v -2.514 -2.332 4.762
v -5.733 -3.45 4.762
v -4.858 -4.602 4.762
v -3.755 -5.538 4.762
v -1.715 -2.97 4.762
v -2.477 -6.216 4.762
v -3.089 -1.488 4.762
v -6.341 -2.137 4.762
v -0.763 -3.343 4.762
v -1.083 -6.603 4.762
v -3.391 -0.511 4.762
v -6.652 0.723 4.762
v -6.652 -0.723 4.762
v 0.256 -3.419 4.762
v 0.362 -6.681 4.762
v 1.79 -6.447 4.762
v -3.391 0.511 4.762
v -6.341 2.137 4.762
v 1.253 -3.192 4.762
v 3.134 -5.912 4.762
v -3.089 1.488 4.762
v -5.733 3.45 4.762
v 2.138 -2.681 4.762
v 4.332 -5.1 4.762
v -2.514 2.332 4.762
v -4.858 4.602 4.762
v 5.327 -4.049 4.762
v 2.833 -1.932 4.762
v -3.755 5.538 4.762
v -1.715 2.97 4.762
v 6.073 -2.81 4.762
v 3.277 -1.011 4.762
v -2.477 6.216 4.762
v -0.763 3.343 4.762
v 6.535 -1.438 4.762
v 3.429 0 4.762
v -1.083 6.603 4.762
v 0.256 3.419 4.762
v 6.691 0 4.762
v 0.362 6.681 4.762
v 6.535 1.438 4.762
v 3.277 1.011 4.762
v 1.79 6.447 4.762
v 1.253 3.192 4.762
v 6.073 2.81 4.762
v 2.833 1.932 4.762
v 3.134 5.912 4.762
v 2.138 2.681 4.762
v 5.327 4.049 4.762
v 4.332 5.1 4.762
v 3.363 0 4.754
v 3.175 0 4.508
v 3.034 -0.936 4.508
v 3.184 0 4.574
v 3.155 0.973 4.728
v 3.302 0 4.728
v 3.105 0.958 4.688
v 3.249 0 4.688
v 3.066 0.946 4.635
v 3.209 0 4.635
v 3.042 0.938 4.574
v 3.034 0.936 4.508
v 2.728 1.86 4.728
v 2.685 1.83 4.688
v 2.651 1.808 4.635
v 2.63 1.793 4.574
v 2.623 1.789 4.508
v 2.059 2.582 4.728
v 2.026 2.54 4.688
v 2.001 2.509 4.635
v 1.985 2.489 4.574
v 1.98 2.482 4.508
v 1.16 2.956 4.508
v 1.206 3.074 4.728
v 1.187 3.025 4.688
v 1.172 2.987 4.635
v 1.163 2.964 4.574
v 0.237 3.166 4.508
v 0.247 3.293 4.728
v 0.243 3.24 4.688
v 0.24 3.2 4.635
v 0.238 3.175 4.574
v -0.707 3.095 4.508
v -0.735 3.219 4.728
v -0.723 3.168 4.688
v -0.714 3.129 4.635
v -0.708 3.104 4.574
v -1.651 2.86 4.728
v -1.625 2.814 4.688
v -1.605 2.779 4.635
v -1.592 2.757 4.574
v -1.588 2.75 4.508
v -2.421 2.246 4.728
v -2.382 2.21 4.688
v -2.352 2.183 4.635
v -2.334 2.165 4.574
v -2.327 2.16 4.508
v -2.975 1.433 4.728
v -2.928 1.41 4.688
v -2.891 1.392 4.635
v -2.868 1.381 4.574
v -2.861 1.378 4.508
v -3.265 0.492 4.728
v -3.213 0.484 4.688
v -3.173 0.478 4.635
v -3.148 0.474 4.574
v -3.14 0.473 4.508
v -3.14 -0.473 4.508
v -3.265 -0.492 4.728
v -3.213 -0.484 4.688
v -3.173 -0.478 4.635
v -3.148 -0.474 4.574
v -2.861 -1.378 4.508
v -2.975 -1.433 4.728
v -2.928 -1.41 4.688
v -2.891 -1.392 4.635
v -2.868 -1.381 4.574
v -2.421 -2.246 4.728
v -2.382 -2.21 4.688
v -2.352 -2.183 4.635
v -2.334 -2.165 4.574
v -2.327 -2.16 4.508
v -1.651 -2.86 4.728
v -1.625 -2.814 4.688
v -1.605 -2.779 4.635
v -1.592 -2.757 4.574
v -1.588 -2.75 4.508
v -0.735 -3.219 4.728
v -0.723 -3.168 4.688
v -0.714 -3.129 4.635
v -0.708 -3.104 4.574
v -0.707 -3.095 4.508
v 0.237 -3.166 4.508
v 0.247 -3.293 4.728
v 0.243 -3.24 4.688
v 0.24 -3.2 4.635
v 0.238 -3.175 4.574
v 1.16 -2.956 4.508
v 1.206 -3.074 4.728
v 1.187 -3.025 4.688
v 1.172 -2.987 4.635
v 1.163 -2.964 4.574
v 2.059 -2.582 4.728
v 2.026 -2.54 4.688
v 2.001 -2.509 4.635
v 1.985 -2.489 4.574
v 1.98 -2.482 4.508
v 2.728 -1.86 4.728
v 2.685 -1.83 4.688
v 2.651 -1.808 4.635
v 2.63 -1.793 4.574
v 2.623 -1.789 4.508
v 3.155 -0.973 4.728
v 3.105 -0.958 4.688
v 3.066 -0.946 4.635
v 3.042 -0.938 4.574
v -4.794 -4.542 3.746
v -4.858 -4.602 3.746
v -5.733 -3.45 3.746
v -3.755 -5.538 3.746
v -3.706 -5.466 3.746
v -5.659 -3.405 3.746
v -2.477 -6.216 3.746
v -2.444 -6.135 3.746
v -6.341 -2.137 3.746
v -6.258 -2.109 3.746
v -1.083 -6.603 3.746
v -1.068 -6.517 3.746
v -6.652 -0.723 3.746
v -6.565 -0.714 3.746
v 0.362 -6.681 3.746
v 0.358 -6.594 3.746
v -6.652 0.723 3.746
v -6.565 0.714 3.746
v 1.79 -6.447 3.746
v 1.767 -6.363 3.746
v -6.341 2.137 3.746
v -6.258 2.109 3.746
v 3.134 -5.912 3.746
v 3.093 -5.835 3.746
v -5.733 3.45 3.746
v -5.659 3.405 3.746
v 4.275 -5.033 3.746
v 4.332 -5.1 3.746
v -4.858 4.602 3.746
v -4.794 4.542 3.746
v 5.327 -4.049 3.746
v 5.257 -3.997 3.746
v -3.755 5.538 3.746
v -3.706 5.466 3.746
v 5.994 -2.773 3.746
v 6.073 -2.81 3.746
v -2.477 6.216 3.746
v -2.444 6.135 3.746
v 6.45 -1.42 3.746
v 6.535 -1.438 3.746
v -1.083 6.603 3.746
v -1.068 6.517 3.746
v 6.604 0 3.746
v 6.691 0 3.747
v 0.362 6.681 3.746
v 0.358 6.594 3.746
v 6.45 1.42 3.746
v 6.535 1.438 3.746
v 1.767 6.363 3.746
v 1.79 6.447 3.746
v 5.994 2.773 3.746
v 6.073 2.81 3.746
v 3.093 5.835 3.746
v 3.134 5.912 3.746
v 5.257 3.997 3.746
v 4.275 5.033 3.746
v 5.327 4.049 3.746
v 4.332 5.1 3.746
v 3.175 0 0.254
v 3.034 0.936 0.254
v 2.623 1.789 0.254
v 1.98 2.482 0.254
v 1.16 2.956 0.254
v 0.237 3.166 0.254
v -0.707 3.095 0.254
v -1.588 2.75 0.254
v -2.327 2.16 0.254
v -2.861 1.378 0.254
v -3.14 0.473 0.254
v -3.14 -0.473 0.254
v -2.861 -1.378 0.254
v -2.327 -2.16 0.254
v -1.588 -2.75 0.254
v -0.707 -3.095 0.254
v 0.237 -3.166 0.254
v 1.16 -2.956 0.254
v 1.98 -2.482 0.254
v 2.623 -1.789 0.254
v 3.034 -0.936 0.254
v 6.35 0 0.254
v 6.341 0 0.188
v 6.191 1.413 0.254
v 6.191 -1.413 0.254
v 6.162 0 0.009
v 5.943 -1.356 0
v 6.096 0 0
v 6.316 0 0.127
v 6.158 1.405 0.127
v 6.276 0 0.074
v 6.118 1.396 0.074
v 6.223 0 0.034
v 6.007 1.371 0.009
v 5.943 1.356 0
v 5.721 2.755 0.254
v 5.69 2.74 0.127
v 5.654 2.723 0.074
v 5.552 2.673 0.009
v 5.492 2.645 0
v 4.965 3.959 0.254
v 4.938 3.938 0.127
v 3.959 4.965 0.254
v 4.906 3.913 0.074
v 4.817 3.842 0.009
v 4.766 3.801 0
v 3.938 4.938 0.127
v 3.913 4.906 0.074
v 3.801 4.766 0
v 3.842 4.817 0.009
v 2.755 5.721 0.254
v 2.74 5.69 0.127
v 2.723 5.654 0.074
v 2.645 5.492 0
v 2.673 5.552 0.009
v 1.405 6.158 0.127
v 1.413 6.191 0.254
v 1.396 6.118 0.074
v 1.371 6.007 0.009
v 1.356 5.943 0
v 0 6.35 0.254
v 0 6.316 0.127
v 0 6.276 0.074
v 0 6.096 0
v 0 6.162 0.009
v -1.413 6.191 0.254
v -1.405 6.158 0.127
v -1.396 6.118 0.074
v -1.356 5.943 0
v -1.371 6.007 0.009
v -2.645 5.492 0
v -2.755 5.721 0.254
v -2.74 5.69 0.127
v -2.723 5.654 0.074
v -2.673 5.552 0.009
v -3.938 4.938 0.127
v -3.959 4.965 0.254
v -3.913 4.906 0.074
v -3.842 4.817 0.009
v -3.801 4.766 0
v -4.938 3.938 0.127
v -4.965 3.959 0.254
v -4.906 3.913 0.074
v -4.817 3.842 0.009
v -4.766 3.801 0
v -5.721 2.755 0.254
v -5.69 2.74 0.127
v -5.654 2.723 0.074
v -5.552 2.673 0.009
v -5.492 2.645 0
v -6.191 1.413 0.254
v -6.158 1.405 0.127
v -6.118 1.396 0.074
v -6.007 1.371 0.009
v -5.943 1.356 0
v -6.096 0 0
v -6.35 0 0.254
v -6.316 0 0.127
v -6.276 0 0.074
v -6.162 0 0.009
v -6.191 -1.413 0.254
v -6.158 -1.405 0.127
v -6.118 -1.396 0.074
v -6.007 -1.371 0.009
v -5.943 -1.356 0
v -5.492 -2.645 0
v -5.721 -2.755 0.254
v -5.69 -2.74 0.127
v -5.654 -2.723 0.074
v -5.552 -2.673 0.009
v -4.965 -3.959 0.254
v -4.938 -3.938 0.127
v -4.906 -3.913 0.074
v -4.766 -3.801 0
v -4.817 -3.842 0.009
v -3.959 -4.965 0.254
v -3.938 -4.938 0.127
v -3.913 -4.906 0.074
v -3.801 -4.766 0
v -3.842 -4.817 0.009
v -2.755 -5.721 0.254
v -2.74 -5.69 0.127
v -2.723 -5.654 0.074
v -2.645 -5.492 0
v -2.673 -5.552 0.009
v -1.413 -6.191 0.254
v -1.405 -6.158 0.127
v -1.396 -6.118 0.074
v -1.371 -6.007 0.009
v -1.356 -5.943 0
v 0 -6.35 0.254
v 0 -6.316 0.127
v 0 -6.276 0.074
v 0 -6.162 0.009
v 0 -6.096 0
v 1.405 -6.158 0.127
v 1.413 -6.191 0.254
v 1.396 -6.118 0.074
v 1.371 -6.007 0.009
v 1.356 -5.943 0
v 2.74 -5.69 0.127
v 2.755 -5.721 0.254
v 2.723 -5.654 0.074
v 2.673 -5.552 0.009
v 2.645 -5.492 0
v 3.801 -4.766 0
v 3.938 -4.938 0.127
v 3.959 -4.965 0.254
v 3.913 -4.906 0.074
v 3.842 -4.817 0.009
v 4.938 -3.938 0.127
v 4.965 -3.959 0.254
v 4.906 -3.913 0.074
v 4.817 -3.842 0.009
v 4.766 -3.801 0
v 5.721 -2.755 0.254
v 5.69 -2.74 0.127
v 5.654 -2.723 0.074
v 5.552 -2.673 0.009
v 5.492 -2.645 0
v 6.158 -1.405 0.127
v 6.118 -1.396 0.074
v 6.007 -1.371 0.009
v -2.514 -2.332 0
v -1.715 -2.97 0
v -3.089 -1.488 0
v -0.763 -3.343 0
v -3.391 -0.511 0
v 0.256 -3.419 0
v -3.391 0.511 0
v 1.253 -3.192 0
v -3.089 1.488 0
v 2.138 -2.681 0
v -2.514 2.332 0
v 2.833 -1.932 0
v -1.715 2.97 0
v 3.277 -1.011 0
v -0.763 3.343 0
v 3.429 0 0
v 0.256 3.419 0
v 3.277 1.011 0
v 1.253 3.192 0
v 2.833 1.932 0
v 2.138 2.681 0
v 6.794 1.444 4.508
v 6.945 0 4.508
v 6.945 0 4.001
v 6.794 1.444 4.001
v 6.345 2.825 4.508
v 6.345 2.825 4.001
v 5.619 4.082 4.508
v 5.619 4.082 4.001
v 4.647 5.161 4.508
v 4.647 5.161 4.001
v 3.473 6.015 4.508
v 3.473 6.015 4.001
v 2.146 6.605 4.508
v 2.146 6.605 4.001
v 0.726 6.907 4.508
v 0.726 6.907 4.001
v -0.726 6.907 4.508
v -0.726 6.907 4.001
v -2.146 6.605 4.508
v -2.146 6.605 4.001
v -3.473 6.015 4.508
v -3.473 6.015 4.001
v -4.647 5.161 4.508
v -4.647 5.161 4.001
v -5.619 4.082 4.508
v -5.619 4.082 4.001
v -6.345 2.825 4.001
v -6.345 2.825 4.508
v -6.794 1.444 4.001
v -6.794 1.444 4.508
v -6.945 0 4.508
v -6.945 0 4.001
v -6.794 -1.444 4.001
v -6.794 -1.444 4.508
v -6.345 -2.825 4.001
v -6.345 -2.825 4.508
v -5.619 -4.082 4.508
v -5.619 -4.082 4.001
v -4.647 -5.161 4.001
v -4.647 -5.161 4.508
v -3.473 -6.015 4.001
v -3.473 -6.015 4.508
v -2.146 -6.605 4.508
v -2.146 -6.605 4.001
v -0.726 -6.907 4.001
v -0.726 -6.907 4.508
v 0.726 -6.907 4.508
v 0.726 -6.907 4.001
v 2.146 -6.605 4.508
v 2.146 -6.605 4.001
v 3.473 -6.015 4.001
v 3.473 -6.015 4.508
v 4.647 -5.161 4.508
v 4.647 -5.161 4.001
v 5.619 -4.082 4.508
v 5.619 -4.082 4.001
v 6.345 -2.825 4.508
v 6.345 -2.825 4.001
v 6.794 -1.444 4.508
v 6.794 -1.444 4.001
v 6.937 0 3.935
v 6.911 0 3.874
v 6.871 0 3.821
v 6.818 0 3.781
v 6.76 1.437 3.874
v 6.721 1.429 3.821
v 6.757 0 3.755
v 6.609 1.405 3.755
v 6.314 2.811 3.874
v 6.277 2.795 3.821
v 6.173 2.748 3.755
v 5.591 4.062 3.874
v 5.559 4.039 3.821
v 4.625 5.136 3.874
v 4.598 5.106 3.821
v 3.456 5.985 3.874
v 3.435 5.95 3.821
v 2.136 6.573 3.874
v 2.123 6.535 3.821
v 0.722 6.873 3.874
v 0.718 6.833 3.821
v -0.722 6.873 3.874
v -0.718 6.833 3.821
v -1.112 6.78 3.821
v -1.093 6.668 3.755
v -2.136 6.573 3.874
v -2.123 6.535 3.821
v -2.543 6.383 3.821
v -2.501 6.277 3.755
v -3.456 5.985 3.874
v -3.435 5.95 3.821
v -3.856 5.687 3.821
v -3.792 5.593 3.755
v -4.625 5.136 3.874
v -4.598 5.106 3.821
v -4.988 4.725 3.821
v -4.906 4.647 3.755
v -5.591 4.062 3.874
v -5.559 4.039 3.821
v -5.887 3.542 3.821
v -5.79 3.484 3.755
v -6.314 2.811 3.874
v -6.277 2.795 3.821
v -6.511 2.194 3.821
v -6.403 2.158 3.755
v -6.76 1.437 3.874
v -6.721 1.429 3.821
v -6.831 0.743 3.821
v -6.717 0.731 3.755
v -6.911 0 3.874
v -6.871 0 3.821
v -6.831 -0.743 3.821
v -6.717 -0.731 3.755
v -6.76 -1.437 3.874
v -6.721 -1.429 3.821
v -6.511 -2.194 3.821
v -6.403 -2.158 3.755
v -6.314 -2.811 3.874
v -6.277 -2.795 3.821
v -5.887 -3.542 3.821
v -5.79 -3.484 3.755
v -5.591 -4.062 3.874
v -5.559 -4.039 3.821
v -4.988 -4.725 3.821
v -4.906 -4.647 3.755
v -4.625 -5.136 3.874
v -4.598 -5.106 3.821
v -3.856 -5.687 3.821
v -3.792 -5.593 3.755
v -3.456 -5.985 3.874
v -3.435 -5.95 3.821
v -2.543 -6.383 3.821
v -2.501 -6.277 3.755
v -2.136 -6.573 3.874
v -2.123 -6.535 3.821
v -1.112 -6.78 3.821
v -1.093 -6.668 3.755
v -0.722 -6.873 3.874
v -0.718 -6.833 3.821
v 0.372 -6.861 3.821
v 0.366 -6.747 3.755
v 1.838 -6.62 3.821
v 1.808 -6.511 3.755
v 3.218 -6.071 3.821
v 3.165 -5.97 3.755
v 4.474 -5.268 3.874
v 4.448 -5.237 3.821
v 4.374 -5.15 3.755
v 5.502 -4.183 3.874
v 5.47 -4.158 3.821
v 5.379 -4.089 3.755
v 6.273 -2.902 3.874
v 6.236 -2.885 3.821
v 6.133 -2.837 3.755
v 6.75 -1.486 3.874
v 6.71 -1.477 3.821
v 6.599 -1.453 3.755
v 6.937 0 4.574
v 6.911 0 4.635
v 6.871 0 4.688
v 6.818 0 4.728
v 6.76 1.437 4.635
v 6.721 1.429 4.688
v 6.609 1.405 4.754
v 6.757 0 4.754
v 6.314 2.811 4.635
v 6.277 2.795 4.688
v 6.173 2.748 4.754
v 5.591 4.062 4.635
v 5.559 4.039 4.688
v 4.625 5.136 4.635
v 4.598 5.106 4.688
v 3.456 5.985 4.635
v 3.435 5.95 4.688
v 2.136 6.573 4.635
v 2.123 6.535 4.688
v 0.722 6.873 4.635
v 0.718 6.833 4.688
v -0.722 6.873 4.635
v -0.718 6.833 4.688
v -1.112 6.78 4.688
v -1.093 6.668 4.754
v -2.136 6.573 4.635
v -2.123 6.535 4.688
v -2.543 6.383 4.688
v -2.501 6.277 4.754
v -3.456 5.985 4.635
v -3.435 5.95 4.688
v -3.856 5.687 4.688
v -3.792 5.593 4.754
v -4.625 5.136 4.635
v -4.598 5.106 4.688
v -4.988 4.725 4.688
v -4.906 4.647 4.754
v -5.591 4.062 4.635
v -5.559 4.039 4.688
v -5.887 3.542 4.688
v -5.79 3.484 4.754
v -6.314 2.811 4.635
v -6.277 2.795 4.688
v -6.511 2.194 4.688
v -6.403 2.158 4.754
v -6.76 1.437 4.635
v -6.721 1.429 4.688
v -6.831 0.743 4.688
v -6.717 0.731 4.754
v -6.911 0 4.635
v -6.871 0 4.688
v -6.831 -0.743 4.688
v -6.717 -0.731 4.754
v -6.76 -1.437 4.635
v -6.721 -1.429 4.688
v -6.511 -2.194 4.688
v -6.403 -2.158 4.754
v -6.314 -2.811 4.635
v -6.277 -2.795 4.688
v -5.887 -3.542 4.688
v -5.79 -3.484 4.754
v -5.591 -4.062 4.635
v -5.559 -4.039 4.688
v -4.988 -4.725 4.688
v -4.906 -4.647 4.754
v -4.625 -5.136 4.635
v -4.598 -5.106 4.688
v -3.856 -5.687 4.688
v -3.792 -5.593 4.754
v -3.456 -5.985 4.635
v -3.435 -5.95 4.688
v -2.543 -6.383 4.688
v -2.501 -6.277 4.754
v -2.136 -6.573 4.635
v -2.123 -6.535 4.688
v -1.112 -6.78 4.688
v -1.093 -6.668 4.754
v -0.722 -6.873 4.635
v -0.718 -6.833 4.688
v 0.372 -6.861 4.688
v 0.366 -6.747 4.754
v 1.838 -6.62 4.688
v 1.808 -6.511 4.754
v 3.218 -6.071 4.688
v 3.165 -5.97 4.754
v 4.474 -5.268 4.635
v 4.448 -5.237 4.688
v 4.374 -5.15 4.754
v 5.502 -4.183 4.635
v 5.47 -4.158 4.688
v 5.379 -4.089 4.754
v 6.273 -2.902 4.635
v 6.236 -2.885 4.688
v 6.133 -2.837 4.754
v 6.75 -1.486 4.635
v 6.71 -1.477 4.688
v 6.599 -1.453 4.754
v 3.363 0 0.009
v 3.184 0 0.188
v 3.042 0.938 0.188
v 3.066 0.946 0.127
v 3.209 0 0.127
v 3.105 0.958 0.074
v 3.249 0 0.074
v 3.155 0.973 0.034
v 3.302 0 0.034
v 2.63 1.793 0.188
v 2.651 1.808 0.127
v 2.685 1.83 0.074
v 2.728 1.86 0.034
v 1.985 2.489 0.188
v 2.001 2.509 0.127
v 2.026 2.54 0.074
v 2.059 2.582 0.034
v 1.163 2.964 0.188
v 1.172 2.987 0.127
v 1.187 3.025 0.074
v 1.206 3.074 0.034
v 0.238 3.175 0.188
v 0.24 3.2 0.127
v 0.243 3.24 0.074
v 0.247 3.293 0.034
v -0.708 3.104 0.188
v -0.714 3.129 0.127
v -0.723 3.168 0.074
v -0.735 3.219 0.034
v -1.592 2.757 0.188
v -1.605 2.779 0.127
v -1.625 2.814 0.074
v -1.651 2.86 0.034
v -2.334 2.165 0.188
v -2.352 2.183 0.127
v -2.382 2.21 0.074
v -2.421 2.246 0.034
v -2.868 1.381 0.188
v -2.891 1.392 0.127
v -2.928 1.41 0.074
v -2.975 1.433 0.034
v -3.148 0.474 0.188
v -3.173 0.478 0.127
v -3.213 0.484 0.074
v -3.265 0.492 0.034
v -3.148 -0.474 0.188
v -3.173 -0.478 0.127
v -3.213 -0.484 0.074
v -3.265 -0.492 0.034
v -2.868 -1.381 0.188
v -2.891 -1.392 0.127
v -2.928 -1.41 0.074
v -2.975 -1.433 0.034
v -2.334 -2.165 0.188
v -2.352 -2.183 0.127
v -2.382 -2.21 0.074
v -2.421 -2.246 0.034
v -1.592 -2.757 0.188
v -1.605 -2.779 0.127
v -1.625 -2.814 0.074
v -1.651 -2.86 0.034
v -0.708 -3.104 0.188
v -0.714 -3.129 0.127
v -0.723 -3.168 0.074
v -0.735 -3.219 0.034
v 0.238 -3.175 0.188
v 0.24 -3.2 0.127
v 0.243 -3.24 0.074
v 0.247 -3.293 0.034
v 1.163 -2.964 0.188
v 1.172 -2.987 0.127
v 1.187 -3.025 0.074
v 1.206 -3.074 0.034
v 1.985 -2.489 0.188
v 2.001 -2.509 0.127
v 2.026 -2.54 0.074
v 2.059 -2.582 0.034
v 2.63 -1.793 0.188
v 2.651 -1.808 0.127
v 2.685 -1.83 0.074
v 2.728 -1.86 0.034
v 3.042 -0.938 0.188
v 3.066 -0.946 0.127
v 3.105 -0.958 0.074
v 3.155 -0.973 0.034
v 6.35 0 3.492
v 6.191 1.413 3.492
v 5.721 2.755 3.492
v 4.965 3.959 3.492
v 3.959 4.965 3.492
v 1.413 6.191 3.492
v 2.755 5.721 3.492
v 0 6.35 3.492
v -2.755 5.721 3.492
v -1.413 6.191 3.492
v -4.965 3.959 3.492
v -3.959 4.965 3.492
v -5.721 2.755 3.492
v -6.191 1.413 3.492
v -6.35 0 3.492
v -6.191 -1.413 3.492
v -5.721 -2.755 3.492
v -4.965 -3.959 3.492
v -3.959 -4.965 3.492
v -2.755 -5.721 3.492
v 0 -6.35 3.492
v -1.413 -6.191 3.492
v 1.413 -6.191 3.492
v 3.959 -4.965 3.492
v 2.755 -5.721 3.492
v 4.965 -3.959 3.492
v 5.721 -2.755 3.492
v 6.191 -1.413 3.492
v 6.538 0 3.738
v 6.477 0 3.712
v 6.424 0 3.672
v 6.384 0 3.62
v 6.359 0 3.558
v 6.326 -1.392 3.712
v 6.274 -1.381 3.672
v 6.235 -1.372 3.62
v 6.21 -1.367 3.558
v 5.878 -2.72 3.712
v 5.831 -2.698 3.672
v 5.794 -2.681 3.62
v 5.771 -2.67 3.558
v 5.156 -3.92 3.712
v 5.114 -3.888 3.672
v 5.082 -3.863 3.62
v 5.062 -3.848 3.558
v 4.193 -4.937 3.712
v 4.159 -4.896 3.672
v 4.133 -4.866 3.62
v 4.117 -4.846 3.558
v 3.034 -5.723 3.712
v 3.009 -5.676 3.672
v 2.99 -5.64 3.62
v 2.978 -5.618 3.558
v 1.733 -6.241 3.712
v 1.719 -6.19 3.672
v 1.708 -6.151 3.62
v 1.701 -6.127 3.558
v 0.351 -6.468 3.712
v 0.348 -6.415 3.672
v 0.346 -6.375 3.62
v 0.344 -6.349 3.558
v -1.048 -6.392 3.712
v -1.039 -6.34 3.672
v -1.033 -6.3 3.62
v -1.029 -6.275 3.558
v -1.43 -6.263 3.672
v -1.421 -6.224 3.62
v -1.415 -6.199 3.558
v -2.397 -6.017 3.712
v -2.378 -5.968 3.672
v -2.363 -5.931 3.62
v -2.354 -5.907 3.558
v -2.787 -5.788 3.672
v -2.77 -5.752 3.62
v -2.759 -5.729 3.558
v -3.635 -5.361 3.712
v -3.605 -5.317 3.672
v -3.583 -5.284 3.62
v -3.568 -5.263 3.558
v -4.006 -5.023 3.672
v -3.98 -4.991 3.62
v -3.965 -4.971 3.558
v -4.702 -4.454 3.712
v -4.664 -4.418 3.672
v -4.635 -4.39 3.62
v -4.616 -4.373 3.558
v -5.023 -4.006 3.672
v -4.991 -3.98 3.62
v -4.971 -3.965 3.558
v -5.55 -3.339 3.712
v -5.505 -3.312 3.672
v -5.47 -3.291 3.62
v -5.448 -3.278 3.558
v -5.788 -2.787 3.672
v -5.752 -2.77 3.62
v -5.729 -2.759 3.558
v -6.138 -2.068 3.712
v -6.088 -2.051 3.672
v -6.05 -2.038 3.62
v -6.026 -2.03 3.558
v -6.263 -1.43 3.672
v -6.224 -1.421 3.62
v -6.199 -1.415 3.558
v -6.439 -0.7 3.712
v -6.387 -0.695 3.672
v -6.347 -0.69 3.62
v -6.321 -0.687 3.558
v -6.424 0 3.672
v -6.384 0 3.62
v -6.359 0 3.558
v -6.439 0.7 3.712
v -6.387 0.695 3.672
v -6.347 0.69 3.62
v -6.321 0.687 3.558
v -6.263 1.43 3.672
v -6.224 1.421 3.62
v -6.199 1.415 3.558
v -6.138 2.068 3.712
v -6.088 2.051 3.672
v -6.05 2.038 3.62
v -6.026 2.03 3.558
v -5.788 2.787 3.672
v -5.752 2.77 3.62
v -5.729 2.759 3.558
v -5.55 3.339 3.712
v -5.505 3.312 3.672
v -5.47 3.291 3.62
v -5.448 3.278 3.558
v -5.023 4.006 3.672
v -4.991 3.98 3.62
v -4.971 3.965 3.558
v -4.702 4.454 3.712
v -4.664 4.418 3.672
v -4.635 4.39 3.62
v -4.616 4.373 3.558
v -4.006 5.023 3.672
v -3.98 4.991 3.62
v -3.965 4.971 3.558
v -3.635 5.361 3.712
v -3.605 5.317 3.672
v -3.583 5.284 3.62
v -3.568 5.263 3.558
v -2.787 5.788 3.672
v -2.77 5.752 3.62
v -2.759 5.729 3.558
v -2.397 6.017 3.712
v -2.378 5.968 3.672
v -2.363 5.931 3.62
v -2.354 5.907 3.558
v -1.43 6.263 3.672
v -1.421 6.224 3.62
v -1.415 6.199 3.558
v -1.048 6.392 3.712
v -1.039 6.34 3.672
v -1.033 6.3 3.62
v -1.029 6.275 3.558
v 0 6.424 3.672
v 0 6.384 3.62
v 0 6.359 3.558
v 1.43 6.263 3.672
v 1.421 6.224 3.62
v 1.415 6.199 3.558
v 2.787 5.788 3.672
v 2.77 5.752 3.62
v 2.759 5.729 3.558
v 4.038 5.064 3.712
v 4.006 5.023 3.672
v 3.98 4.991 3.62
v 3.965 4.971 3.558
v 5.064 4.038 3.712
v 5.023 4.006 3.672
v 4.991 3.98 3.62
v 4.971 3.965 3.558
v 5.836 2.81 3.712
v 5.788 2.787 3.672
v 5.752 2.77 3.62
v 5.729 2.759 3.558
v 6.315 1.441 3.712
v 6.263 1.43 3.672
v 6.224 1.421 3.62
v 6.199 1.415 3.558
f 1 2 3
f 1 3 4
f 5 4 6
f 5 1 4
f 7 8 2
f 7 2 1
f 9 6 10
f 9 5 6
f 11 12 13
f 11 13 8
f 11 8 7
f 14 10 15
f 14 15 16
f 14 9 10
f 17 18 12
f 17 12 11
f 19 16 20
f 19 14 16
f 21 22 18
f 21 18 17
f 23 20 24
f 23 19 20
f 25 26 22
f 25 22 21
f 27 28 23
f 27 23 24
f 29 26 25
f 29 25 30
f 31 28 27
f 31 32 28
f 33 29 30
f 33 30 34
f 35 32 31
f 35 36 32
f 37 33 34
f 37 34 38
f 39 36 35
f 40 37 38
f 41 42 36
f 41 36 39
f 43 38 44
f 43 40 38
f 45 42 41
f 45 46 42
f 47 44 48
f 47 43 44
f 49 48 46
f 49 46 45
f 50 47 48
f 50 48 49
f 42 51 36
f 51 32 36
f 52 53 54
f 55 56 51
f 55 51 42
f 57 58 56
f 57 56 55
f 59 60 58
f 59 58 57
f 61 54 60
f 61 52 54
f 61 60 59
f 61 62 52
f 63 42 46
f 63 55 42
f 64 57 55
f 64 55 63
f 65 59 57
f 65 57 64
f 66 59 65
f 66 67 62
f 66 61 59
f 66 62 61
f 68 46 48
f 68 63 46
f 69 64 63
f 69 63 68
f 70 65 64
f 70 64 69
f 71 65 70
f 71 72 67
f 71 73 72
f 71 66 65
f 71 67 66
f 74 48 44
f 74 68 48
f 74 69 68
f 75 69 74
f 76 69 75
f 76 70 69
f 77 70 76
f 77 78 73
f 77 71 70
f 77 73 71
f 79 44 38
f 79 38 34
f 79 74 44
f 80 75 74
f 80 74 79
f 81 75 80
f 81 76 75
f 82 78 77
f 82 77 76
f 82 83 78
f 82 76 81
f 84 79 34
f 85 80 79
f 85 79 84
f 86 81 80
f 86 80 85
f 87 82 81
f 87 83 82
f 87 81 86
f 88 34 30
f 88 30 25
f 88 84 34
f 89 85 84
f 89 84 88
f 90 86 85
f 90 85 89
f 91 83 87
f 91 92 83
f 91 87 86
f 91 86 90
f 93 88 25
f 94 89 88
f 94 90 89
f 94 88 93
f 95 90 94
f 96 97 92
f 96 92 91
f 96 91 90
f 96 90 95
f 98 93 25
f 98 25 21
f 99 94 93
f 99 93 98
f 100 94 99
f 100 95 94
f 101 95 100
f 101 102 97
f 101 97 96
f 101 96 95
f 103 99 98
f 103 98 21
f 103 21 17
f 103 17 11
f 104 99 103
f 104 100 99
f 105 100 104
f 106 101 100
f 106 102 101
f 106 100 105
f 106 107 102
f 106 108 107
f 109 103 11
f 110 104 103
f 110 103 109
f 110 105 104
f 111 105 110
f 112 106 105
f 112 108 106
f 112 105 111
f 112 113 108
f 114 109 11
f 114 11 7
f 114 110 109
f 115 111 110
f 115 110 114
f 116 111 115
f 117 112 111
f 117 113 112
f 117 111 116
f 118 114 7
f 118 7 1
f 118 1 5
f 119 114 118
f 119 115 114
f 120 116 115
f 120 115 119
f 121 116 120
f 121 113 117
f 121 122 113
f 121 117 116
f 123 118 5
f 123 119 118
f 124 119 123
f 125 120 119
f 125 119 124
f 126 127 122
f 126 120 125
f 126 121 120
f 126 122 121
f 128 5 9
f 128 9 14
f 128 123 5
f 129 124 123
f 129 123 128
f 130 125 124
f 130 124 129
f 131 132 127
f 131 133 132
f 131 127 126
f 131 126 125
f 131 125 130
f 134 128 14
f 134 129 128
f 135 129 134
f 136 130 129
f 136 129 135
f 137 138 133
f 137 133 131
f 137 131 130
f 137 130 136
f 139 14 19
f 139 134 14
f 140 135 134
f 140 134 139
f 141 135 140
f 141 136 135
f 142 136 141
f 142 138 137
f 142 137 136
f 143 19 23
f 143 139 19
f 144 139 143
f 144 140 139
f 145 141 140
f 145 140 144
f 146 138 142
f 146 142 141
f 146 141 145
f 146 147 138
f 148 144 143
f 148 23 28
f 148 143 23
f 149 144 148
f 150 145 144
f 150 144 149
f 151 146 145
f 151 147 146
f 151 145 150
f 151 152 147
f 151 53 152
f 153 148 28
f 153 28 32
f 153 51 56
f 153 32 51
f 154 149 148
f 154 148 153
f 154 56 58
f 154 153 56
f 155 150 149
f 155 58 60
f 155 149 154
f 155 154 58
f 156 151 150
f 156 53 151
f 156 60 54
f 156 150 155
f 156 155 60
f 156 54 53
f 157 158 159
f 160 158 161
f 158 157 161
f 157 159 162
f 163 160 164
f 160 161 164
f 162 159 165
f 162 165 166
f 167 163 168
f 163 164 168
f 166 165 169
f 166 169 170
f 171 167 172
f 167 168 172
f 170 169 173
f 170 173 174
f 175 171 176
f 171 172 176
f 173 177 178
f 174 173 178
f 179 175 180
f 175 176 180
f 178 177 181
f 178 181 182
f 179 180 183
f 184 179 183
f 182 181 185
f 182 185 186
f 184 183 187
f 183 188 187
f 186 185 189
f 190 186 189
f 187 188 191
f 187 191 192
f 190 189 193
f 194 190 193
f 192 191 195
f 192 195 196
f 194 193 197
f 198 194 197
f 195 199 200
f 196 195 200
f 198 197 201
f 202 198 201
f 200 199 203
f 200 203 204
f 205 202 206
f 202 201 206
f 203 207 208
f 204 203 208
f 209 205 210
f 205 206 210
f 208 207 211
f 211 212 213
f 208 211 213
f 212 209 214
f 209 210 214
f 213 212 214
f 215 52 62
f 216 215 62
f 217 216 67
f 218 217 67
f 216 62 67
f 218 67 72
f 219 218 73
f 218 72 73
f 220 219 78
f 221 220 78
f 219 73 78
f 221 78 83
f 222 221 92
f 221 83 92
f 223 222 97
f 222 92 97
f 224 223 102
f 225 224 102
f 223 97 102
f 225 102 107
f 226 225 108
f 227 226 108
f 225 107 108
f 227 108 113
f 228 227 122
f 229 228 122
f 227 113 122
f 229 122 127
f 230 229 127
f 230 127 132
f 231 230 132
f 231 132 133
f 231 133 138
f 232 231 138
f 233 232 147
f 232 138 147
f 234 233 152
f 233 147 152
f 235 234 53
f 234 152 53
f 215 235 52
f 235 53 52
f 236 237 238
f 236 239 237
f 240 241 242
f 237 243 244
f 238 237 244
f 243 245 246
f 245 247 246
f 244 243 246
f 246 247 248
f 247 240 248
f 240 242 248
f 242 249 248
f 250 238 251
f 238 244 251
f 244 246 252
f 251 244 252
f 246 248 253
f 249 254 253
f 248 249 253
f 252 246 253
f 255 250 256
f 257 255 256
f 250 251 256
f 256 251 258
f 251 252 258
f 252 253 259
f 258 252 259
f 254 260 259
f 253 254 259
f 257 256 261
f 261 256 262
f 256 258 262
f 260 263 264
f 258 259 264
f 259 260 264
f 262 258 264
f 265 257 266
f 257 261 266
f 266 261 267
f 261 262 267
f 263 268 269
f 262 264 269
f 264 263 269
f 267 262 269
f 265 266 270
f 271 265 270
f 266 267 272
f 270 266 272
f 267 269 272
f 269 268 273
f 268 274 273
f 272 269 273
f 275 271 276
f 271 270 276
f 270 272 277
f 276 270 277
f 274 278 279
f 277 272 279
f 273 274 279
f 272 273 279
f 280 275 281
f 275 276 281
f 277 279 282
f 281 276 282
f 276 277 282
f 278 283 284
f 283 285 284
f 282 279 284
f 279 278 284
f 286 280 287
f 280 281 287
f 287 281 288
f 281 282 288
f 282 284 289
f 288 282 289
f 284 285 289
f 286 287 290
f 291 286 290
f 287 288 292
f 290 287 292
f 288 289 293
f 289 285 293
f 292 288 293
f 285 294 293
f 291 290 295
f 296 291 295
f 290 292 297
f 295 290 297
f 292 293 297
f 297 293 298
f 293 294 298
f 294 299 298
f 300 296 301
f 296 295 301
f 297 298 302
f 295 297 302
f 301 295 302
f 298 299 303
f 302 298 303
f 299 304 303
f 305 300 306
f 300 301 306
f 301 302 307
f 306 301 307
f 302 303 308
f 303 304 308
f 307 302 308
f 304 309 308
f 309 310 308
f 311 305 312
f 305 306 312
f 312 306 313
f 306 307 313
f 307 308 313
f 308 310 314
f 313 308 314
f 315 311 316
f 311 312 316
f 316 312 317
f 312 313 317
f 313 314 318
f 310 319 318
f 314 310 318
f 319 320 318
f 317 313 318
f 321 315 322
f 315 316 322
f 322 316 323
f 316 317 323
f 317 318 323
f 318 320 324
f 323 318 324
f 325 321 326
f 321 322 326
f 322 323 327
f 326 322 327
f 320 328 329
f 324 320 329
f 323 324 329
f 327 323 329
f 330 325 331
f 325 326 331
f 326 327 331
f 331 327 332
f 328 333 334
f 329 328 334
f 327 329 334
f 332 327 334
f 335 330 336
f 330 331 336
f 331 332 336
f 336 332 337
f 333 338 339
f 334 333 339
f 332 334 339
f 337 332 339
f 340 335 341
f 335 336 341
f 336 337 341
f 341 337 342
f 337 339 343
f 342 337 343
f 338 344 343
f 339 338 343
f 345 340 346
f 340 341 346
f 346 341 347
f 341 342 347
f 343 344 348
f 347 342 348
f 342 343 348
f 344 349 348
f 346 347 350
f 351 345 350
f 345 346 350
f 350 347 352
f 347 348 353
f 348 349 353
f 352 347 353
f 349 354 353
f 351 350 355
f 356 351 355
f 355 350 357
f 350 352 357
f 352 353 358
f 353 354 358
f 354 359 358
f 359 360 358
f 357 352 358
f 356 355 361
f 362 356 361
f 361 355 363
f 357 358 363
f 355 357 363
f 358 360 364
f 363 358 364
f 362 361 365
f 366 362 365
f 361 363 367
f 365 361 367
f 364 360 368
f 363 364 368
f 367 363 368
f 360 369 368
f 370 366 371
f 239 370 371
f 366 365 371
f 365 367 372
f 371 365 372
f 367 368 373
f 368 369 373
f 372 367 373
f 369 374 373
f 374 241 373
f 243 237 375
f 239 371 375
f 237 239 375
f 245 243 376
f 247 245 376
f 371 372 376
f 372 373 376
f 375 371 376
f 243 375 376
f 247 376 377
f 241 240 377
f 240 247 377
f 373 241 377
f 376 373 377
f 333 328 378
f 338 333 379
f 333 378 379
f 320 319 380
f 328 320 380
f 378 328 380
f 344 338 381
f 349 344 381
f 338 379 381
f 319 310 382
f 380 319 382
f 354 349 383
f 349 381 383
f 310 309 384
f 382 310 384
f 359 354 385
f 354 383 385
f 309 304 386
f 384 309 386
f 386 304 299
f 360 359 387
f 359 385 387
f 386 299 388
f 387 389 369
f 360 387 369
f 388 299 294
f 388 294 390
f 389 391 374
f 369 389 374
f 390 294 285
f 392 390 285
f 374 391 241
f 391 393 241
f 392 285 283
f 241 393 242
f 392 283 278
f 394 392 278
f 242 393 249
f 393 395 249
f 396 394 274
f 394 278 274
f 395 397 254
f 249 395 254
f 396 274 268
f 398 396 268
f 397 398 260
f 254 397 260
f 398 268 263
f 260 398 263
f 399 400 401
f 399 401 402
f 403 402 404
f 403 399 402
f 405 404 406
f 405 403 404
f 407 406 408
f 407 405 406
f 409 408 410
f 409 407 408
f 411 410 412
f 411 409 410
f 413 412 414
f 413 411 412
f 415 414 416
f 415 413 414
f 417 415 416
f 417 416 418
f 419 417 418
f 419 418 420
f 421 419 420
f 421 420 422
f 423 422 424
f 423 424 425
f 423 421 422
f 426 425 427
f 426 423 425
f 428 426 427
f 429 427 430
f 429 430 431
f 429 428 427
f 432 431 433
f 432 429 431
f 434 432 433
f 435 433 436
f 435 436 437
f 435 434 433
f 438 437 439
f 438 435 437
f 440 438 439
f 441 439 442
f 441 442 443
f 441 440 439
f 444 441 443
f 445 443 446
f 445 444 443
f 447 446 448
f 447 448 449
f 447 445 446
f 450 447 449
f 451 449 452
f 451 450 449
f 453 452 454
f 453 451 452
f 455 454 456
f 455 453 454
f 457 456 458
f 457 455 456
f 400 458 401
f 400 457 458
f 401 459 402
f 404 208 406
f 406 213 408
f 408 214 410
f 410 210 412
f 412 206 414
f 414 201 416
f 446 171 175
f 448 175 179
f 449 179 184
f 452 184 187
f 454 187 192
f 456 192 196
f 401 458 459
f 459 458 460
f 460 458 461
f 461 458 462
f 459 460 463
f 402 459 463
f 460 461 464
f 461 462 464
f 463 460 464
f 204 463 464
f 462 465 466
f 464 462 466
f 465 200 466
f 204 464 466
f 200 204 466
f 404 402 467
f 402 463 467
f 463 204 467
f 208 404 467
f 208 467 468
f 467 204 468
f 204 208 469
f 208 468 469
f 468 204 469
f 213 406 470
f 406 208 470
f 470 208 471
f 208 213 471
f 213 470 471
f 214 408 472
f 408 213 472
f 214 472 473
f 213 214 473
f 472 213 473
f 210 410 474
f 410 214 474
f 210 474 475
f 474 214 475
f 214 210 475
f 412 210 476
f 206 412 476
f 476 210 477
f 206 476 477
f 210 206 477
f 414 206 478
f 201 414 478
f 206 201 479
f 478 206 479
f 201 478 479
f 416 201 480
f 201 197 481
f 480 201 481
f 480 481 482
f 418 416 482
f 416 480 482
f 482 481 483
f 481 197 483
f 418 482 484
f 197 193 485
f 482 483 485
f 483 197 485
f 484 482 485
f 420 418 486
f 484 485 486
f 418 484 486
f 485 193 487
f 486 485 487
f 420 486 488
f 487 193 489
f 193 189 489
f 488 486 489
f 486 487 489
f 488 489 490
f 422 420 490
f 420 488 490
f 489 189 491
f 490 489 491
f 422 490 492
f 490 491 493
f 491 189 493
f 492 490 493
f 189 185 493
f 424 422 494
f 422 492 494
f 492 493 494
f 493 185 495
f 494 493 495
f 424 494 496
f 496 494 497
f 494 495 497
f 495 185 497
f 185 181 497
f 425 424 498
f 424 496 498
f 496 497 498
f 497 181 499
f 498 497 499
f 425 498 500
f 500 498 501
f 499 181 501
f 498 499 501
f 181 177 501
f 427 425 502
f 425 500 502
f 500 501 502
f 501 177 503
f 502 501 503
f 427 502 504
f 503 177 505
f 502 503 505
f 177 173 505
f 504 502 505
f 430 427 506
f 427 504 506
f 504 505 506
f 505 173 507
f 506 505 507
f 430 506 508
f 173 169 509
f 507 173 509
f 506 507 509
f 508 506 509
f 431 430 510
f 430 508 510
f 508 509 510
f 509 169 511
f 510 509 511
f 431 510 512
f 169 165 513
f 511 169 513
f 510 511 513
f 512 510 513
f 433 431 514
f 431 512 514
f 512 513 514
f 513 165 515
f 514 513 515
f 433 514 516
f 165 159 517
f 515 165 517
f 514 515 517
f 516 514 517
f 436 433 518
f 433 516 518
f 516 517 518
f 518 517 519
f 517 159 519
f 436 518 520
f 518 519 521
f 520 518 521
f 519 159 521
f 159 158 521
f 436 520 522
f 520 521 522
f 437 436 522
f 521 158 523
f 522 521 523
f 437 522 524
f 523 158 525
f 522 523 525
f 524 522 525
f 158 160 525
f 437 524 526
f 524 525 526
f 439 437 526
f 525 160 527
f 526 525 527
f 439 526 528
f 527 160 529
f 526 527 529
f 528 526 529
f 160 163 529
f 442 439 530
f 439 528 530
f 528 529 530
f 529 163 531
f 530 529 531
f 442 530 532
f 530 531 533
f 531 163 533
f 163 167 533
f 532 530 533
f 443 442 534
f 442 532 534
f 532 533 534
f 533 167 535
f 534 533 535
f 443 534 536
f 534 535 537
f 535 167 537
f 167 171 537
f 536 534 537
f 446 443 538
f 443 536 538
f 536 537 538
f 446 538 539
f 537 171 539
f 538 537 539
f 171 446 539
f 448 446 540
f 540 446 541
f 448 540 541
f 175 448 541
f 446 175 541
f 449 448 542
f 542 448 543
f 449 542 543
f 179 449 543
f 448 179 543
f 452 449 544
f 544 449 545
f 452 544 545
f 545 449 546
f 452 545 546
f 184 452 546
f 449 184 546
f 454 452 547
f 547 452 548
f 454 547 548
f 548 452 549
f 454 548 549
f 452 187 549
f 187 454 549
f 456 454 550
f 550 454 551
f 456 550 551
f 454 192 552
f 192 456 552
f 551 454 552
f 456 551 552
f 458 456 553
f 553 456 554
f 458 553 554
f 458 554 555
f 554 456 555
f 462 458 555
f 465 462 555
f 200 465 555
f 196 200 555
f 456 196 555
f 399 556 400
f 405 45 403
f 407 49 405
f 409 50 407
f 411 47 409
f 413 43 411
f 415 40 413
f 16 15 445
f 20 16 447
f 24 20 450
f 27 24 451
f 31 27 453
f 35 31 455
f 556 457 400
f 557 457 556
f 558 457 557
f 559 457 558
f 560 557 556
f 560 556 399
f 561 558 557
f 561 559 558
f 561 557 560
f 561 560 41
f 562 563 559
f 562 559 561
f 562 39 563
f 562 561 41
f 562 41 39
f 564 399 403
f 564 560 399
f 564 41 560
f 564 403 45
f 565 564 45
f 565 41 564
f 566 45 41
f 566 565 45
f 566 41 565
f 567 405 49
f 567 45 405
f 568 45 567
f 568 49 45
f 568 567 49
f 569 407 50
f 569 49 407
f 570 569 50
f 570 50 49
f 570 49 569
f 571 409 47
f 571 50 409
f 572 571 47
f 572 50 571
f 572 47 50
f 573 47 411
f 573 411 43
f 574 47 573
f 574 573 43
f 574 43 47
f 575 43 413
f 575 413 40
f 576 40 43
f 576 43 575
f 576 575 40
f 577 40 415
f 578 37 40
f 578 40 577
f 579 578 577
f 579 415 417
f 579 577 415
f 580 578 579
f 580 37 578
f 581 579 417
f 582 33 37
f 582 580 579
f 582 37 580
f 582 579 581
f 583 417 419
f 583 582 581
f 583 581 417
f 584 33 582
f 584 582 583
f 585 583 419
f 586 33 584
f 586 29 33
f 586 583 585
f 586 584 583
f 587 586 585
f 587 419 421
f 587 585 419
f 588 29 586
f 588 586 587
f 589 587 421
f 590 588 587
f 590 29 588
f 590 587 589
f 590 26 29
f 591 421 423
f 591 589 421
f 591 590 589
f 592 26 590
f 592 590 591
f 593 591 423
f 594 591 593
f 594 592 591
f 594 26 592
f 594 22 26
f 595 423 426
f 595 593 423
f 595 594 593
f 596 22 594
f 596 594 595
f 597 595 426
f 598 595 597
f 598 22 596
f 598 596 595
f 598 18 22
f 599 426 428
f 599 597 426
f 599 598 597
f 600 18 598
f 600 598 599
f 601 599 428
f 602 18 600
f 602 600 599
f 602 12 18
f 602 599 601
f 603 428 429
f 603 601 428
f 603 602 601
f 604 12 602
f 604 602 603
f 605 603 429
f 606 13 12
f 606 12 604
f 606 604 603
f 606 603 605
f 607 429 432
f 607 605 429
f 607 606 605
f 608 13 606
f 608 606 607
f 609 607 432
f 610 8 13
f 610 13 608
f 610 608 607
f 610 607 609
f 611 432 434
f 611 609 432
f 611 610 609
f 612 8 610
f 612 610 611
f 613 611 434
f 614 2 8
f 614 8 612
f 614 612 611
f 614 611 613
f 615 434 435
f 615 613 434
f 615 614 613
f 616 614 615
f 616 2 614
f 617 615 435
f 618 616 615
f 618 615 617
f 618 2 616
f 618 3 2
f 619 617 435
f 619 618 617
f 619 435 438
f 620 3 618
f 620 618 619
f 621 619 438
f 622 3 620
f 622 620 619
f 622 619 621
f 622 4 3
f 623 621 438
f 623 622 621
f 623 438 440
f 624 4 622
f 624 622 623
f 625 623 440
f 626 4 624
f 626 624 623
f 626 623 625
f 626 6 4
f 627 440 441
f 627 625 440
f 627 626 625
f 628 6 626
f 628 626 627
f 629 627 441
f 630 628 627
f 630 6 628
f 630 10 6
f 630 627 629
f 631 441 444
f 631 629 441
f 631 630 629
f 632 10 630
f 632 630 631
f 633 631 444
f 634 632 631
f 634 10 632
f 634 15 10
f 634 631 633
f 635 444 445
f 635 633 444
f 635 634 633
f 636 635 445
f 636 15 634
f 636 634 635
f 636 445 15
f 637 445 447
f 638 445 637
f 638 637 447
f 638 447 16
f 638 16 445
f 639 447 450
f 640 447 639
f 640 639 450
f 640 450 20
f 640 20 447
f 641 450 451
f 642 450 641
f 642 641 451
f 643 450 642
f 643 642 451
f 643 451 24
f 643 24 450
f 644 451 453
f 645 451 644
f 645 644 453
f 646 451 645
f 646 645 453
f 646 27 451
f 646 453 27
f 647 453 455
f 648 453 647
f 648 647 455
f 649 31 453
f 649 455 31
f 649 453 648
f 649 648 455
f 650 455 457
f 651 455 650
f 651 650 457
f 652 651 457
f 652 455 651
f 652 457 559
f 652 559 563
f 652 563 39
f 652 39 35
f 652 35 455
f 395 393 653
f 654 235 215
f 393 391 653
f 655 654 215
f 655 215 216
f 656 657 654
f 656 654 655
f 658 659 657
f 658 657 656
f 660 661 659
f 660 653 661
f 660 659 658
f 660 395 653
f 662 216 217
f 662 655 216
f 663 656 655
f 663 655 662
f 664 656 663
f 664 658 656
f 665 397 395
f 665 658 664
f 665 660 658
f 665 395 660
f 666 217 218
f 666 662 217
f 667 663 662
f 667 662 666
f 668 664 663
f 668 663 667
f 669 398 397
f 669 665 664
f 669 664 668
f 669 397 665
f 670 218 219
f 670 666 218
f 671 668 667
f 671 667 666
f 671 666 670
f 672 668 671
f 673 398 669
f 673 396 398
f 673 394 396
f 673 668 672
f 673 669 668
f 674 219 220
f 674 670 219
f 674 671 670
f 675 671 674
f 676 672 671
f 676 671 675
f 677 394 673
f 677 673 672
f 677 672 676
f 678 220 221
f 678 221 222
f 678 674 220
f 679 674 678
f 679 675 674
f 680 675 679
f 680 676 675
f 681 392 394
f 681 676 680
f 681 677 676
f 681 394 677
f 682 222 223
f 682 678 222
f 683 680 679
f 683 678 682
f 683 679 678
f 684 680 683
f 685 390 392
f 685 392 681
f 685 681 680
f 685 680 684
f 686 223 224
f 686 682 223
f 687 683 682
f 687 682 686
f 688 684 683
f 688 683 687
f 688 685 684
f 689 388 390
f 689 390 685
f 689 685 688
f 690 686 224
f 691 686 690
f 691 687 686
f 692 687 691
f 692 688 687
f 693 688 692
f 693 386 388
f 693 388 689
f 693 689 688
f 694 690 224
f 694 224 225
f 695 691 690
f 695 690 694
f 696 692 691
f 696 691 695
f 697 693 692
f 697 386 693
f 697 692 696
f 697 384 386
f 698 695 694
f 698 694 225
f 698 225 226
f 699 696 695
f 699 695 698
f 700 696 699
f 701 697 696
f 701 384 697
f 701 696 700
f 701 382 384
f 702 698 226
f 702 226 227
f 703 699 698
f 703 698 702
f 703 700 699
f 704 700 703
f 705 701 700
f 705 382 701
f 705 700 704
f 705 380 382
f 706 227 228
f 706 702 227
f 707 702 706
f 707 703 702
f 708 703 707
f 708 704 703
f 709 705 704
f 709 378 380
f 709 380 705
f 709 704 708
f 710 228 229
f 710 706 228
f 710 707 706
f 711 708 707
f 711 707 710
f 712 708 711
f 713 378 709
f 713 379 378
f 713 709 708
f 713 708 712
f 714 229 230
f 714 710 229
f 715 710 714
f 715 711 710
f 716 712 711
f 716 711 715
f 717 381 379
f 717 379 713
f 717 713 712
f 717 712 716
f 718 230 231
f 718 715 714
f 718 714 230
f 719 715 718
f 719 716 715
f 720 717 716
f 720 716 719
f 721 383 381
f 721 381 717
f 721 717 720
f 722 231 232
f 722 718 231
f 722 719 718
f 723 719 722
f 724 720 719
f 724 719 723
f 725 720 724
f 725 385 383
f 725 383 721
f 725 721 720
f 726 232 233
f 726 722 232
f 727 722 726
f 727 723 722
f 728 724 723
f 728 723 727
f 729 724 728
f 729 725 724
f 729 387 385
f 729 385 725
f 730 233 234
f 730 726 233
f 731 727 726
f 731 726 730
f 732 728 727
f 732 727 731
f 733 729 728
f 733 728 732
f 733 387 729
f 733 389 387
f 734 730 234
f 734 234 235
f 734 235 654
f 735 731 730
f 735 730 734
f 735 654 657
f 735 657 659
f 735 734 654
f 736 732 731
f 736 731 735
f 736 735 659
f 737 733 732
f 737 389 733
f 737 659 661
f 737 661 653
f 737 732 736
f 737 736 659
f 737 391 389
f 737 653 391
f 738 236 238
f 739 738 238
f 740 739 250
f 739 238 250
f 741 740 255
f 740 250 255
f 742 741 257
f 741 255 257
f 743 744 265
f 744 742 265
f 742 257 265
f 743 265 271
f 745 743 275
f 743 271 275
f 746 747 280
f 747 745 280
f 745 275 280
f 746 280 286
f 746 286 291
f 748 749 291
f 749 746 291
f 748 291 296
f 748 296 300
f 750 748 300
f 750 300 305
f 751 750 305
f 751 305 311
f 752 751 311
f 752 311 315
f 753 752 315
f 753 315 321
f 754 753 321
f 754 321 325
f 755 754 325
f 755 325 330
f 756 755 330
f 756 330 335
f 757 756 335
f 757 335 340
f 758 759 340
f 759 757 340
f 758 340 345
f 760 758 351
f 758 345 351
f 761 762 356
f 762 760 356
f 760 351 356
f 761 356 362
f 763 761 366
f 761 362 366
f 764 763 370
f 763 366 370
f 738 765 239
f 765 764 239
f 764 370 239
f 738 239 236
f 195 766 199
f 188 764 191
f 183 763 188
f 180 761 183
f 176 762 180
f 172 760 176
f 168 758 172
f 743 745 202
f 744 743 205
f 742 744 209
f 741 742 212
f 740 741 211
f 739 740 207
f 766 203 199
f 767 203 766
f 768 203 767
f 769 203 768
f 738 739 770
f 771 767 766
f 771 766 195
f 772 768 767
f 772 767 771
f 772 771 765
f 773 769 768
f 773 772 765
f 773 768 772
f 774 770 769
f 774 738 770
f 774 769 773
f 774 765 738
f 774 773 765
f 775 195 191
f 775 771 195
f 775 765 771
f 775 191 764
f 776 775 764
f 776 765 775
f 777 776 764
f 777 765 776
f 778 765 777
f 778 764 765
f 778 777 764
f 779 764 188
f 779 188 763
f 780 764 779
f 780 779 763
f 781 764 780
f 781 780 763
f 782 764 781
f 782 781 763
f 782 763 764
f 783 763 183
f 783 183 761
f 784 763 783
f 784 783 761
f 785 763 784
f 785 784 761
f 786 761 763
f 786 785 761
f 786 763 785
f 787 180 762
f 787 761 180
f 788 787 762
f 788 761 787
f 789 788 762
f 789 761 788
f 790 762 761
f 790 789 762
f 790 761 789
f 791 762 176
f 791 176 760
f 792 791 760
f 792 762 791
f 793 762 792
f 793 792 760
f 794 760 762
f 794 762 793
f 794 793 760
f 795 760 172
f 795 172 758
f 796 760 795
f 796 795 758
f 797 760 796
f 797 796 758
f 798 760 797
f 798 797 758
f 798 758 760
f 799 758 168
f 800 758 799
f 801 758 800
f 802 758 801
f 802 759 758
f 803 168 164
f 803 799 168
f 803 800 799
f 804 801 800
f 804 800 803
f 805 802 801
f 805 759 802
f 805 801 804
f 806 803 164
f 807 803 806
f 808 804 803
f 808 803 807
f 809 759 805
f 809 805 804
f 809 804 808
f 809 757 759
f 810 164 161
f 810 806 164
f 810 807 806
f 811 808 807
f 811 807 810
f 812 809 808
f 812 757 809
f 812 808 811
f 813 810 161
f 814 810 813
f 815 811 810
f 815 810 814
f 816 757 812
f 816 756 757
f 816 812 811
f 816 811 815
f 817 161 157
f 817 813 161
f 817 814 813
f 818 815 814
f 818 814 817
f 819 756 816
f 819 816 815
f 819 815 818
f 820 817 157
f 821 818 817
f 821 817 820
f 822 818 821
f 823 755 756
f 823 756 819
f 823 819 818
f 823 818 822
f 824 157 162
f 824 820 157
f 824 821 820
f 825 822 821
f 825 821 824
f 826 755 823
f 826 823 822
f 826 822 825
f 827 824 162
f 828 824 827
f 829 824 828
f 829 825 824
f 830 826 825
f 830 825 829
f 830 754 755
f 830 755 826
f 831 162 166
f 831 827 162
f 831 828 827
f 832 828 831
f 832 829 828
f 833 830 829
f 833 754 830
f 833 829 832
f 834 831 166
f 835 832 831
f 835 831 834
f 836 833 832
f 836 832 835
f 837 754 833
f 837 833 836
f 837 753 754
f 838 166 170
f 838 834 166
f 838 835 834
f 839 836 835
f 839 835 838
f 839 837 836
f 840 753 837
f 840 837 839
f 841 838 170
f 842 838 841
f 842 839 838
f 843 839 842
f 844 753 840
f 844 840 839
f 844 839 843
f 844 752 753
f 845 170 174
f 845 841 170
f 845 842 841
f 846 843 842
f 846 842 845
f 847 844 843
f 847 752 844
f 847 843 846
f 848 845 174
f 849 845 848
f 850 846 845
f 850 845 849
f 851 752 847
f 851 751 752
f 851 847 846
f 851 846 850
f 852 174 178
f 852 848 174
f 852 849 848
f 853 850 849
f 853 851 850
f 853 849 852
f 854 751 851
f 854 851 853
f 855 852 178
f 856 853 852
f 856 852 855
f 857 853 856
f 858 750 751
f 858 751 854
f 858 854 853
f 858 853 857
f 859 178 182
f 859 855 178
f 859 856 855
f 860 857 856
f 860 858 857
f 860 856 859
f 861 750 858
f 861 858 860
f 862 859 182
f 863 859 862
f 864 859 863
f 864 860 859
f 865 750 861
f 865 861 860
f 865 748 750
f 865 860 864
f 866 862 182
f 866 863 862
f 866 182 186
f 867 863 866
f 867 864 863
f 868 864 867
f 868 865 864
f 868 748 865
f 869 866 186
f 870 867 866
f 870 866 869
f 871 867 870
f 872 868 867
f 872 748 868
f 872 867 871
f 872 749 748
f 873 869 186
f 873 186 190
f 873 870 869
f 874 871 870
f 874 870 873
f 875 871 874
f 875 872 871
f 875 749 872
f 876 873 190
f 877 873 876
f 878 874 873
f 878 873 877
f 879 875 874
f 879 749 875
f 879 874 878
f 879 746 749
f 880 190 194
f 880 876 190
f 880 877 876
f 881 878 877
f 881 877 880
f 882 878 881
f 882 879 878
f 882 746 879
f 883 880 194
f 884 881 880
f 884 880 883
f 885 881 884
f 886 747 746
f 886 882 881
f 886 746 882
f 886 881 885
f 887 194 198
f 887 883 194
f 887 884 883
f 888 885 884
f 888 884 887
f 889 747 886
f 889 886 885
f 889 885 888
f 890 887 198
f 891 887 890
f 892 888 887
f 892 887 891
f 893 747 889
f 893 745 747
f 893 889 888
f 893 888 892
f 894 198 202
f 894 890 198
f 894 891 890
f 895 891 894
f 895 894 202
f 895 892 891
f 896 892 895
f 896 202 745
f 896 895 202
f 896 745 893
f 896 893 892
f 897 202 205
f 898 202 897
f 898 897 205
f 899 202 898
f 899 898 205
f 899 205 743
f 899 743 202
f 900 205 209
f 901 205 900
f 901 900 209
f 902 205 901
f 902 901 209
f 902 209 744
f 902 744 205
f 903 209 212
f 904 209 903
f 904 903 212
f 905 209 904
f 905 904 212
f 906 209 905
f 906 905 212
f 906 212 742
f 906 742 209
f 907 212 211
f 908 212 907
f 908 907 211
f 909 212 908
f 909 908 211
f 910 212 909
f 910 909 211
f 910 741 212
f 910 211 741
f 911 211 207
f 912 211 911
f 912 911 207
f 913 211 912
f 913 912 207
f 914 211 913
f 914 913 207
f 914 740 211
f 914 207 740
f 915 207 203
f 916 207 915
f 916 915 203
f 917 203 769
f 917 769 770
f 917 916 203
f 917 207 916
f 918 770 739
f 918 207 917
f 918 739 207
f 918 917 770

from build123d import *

# Parameters (mm, degrees)
SKETCH1_R           = 6.35
BOSS_EXTRUDE1_DEPTH = 4.7625
SKETCH2_R           = 6.9453125
BOSS_EXTRUDE2_DEPTH = 1.016
SKETCH3_R           = 3.175
CUT_EXTRUDE1_DEPTH  = 4.7625
FILLET1_R           = 0.254


with BuildPart() as part:
    # Sketch1 → Boss-Extrude1 (new body)
    with BuildSketch(Plane.XY):
        Circle(SKETCH1_R)
    extrude(amount=BOSS_EXTRUDE1_DEPTH)

    # Sketch2 → Boss-Extrude2 (add)
    with BuildSketch(Plane.XY.offset(4.7625)):
        Circle(SKETCH2_R)
    extrude(amount=-BOSS_EXTRUDE2_DEPTH)

    # Sketch3 → Cut-Extrude1 (cut)
    with BuildSketch(Plane.XY.offset(4.7625)):
        Circle(SKETCH3_R)
    extrude(amount=-CUT_EXTRUDE1_DEPTH, mode=Mode.SUBTRACT)

    # Fillet1
    fillet1_edges = [part.edges().sort_by_distance(p)[0] for p in [
        (-3.175, 0, 4.7625),
        (-3.175, 0, 0),
        (-6.35, 0, 0),
        (-6.35, 0, 3.7465),
        (-6.9453125, 0, 3.7465),
        (-6.9453125, 0, 4.7625),
    ]]
    fillet(fillet1_edges, radius=FILLET1_R)


solid = part.part
